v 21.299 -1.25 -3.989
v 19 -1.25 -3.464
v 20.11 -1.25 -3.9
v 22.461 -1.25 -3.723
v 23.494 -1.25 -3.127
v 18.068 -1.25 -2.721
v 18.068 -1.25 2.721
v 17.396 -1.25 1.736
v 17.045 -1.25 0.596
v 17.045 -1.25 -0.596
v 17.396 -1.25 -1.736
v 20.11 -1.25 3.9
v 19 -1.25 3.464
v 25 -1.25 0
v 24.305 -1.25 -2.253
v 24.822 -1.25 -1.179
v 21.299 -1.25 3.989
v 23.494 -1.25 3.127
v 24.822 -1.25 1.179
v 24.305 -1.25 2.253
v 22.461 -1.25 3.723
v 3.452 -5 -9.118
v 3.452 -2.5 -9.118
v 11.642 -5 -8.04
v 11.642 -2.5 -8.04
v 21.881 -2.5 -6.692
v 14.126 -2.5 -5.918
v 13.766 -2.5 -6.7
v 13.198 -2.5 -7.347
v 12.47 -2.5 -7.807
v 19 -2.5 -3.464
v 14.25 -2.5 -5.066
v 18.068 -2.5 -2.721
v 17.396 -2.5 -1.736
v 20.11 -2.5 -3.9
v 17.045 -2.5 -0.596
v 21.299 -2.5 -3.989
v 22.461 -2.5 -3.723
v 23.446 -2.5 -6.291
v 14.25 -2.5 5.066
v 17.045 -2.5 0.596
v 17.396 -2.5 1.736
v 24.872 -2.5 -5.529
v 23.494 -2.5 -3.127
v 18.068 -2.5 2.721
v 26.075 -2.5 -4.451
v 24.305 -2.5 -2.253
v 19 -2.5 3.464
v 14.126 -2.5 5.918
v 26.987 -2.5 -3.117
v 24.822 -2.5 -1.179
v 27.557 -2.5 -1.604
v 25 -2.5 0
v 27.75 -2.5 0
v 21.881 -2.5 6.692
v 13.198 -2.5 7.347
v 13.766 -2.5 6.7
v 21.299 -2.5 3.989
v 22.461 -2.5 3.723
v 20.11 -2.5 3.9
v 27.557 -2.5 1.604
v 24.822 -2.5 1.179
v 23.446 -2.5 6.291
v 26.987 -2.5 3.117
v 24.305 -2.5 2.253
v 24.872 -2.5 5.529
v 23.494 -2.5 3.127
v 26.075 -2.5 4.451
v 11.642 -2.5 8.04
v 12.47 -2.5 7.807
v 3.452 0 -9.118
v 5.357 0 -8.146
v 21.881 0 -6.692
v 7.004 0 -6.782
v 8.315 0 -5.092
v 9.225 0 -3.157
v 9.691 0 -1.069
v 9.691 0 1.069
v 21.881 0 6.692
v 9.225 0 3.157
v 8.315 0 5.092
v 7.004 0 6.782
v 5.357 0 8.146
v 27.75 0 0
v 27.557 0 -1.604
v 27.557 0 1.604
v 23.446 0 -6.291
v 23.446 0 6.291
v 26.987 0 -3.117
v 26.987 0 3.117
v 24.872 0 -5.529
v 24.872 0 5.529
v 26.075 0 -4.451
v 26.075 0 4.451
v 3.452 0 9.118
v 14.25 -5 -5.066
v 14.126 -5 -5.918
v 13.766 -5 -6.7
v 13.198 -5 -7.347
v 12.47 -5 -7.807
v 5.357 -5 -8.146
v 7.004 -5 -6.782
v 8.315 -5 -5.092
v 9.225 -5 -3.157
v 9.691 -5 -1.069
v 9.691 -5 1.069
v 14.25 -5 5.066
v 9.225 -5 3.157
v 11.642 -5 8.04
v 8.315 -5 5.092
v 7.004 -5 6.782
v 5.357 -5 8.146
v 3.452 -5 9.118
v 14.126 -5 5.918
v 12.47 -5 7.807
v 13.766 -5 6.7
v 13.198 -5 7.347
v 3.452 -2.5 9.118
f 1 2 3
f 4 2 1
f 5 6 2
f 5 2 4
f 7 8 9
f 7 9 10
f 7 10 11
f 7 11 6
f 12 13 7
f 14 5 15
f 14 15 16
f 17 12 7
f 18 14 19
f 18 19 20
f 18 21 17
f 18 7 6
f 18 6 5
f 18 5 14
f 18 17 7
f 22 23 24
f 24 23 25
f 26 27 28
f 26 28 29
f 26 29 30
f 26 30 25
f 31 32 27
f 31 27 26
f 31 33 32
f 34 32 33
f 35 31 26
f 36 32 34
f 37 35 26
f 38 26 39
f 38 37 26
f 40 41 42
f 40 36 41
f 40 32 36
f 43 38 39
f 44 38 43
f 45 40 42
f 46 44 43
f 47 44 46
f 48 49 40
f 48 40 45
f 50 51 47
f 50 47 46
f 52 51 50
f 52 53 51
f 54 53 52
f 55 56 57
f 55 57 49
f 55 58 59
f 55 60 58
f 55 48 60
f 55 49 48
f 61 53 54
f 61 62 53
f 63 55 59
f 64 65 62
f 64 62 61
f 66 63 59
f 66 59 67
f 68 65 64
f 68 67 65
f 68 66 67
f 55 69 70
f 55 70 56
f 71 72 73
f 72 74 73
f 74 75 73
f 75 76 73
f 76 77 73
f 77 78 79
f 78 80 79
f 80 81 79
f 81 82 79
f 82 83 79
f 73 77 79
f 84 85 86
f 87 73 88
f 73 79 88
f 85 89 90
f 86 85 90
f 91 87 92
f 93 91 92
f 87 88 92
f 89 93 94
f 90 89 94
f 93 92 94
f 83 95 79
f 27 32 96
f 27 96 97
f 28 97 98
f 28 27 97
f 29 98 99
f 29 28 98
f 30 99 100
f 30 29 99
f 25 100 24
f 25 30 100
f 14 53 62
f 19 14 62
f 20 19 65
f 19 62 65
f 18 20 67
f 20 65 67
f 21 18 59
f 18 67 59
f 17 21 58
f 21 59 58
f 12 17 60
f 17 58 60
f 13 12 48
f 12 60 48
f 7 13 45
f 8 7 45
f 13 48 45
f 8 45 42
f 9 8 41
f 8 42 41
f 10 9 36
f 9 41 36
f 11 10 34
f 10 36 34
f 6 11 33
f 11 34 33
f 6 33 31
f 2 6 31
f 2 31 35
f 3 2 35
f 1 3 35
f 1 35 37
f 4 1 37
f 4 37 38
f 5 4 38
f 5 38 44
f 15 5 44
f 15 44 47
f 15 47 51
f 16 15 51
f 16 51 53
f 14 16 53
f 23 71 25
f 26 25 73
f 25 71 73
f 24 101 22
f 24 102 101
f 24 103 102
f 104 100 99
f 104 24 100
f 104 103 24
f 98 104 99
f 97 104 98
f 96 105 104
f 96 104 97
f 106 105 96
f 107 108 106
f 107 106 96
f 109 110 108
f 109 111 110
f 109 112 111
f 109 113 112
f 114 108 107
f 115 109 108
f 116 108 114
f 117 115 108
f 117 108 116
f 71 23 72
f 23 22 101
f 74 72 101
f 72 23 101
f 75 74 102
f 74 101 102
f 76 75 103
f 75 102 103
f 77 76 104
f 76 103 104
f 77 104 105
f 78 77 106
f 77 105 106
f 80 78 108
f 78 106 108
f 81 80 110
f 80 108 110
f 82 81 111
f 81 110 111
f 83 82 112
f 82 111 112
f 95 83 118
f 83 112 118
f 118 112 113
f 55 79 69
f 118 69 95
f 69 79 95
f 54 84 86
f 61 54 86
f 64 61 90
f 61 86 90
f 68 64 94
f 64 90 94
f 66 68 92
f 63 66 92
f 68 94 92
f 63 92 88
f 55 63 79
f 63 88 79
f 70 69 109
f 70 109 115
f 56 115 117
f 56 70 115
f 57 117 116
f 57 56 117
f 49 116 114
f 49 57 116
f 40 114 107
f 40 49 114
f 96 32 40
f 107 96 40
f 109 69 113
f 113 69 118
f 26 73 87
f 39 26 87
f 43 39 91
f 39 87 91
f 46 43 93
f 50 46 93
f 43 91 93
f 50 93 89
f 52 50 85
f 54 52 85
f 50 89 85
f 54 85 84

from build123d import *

# Parameters (mm, degrees)
F0_R         = 8
F1_DEPTH     = 10
F2_R         = 1.5
F3_DEPTH     = 22.1
F4_R         = 1.4
F5_DEPTH     = 8
F6_T1_DEPTH  = 25.4217528018
F7_R         = 2
F8_R         = 2
F10_DEPTH    = 2.5
F11_R        = 4
F12_DEPTH    = 6
F14_DEPTH    = 2.5
F15_T1_DEPTH = 9.0773234724
F17_DEPTH    = 25
F18_DEPTH    = 7.25


# Not quite as in the source:
# - a fillet or chamfer that OpenCascade refuses, or shapes differently, is made with other operations: its cross-section is extruded or revolved along the edge and cut away or added


with BuildPart() as f1:
    # F0 (on Front) → F1 (new body)
    with BuildSketch(Plane.XZ):
        with BuildLine():
            ThreePointArc((-5.123475383, -8), (4.5594398703, -8.3343570879), (9.5, 0))
            ThreePointArc((9.5, 0), (2.5991730895, 9.1375215048), (-8.0777472107, 5))
            ThreePointArc((-8.0777472107, 5), (-8.4879541617, 4.2666888975), (-8.8317608663, 3.5))
            ThreePointArc((-8.8317608663, 3.5), (-9.0415515645, -2.9155351664), (-5.123475383, -8))
        make_face()
        Circle(F0_R, mode=Mode.SUBTRACT)
        with BuildLine():
            ThreePointArc((-8.8317608663, 3.5), (-8.4879541617, 4.2666888975), (-8.0777472107, 5))
            Line((-8.0777472107, 5), (-23.5, 5))
            ThreePointArc((-23.5, 5), (-24.7247448714, 4.5811388301), (-25.4364916731, 3.5))
            Line((-25.4364916731, 3.5), (-8.8317608663, 3.5))
        make_face()
        with BuildLine():
            Line((-23.5, -8), (-5.123475383, -8))
            ThreePointArc((-5.123475383, -8), (-9.0415515645, -2.9155351664), (-8.8317608663, 3.5))
            Line((-8.8317608663, 3.5), (-25.4364916731, 3.5))
            ThreePointArc((-25.4364916731, 3.5), (-25.4840593925, 3.252008585), (-25.5, 3))
            Line((-25.5, 3), (-25.5, 0))
            Line((-25.5, 0), (-25.5, -3.5))
            Line((-25.5, -3.5), (-25.5, -6))
            ThreePointArc((-25.5, -6), (-24.9142135624, -7.4142135624), (-23.5, -8))
        make_face()
        with BuildLine():
            ThreePointArc((-25.5, 3), (-25.4840593925, 3.252008585), (-25.4364916731, 3.5))
            Line((-25.4364916731, 3.5), (-25.5, 3.5))
            Line((-25.5, 3.5), (-31.5, 3.5))
            ThreePointArc((-31.5, 3.5), (-32.2071067812, 3.2071067812), (-32.5, 2.5))
            Line((-32.5, 2.5), (-32.5, 1.5))
            Line((-32.5, 1.5), (-32.5, 0))
            Line((-32.5, 0), (-32.5, -1.5))
            Line((-32.5, -1.5), (-32.5, -2.5))
            ThreePointArc((-32.5, -2.5), (-32.2071067812, -3.2071067812), (-31.5, -3.5))
            Line((-31.5, -3.5), (-25.5, -3.5))
            Line((-25.5, -3.5), (-25.5, 0))
            Line((-25.5, 0), (-25.5, 3))
        make_face()
    extrude(amount=F1_DEPTH)

    # F2 (on face) → F3 (cut)
    with BuildSketch(Plane(origin=(-32.5, 0, 0), x_dir=(0, -1, 0), z_dir=(-1, 0, 0))):
        with Locations((5, 0)):
            Circle(F2_R)
    extrude(amount=-F3_DEPTH, mode=Mode.SUBTRACT)

    # F4 (on face) → F5 (cut)
    with BuildSketch(Plane(origin=(0, 0, -8), x_dir=(1, 0, 0), z_dir=(0, 0, -1))):
        with Locations((-12.4, 5)):
            Circle(F4_R)
        with Locations((-19.5, 5)):
            Circle(F4_R)
    extrude(amount=-F5_DEPTH, mode=Mode.SUBTRACT)

    # F6: fillet of radius 2 on 2 edges, made by hand

    # F6_s2 → F6_t1 (cut)
    with BuildSketch(Plane.YZ.offset(-28.4997500063)):
        with BuildLine():
            ThreePointArc((-8.0001, 5.0001), (-9.4143135624, 4.4143135624), (-10.0001, 3.0001))
            Line((-10.0001, 3.0001), (-10.0401, 3.0001))
            ThreePointArc((-10.0401, 3.0001), (-10.04, 4.00005), (-10.04, 5))
            Line((-10.04, 5), (-10, 5.04))
            ThreePointArc((-10, 5.04), (-9.00005, 5.04), (-8.0001, 5.0401))
            Line((-8.0001, 5.0401), (-8.0001, 5.0001))
        make_face()
        with BuildLine():
            ThreePointArc((-1.9999, 5.0001), (-0.5856864376, 4.4143135624), (0.0001, 3.0001))
            Line((0.0001, 3.0001), (0.0401, 3.0001))
            ThreePointArc((0.0401, 3.0001), (0.04, 4.00005), (0.04, 5))
            Line((0.04, 5), (0, 5.04))
            ThreePointArc((0, 5.04), (-0.99995, 5.04), (-1.9999, 5.0401))
            Line((-1.9999, 5.0401), (-1.9999, 5.0001))
        make_face()
    extrude(amount=F6_T1_DEPTH, mode=Mode.SUBTRACT)

    # F7
    f7_edges = [f1.edges().sort_by_distance(p)[0] for p in [
        (-32.5, -10, 0),
        (-32.5, 0, 0),
    ]]
    fillet(f7_edges, radius=F7_R)

    # F8
    f8_edges = [f1.edges().sort_by_distance(p)[0] for p in [
        (-14.311738, -10, -8),
        (-14.311738, 0, -8),
    ]]
    fillet(f8_edges, radius=F8_R)

    # F9 (on Front) → F10 (join)
    with BuildSketch(Plane.XZ):
        with BuildLine():
            ThreePointArc((0.8300844627, 8.6718317984), (6.4467419184, 5.8591147448), (8.7114698505, 0))
            Line((8.7114698505, 0), (14.25, 0))
            ThreePointArc((14.25, 0), (16.5494157481, 5.0749187005), (21.8810517975, 6.6922528143))
            Line((21.8810517975, 6.6922528143), (1.6475767802, 9.3560403352))
            Line((1.6475767802, 9.3560403352), (0.8300844627, 9.4636652405))
            Line((0.8300844627, 9.4636652405), (0.8300844627, 8.6718317984))
        make_face()
        with BuildLine():
            Line((14.25, 0), (8.7114698505, 0))
            ThreePointArc((8.7114698505, 0), (6.4467419184, -5.8591147448), (0.8300844627, -8.6718317984))
            Line((0.8300844627, -8.6718317984), (0.8300844627, -9.4636652405))
            Line((0.8300844627, -9.4636652405), (1.6475767802, -9.3560403352))
            Line((1.6475767802, -9.3560403352), (21.8810517975, -6.6922528143))
            ThreePointArc((21.8810517975, -6.6922528143), (16.5494157481, -5.0749187005), (14.25, 0))
        make_face()
        with BuildLine():
            ThreePointArc((21.8810517975, 6.6922528143), (16.5494157481, 5.0749187005), (14.25, 0))
            Line((14.25, 0), (21, 0))
            Line((21, 0), (21.8810517975, -6.6922528143))
            ThreePointArc((21.8810517975, -6.6922528143), (26.0749187005, -4.4505842519), (27.75, 0))
            ThreePointArc((27.75, 0), (26.0749187005, 4.4505842519), (21.8810517975, 6.6922528143))
        make_face()
        with BuildLine():
            Line((21, 0), (14.25, 0))
            ThreePointArc((14.25, 0), (16.5494157481, -5.0749187005), (21.8810517975, -6.6922528143))
            Line((21.8810517975, -6.6922528143), (21, 0))
        make_face()
        with BuildLine():
            Line((1.6475767802, -9.3560403352), (0.8300844627, -9.4636652405))
            ThreePointArc((0.8300844627, -9.4636652405), (1.2399988261, -9.4187261831), (1.6475767802, -9.3560403352))
        make_face()
        with BuildLine():
            ThreePointArc((1.6475767802, 9.3560403352), (1.2399988261, 9.4187261831), (0.8300844627, 9.4636652405))
            Line((0.8300844627, 9.4636652405), (1.6475767802, 9.3560403352))
        make_face()
    extrude(amount=F10_DEPTH)

    # F11 (on face) → F12 (join)
    with BuildSketch(Plane.XZ.offset(2.5)):
        with Locations((21, 0)):
            Circle(F11_R)
    extrude(amount=F12_DEPTH)

    # F13 (on face) → F14 (join)
    with BuildSketch(Plane.XZ.offset(2.5)):
        with BuildLine():
            Line((14.25, -7.6968998426), (14.25, 0))
            Line((14.25, 0), (14.25, 7.6968998426))
            Line((14.25, 7.6968998426), (1.6475767802, 9.3560403352))
            Line((1.6475767802, 9.3560403352), (1.6475767802, 8.3387943225))
            ThreePointArc((1.6475767802, 8.3387943225), (8.5, 0), (1.6475767802, -8.3387943225))
            Line((1.6475767802, -8.3387943225), (1.6475767802, -9.3560403352))
            Line((1.6475767802, -9.3560403352), (14.25, -7.6968998426))
        make_face()
    extrude(amount=F14_DEPTH)

    # F15: fillet of radius 3 on 2 edges, made by hand

    # F15_s2 → F15_t1 (cut)
    with BuildSketch(Plane.XZ.offset(2.5)):
        with BuildLine():
            ThreePointArc((11.6415785767, 8.0403050378), (13.5055194224, 7.044007899), (14.25, 5.0659704537))
            Line((14.25, 5.0659704537), (14.25, 7.6968998426))
            Line((14.25, 7.6968998426), (11.6415785767, 8.0403050378))
        make_face()
        with BuildLine():
            ThreePointArc((14.25, -5.0659704537), (13.5055194224, -7.044007899), (11.6415785767, -8.0403050378))
            Line((11.6415785767, -8.0403050378), (14.25, -7.6968998426))
            Line((14.25, -7.6968998426), (14.25, -5.0659704537))
        make_face()
    extrude(amount=F15_T1_DEPTH, mode=Mode.SUBTRACT)

    # F16 (on face) → F17 (cut)
    with BuildSketch(Plane.XZ.offset(10)):
        with BuildLine():
            Line((-37.4530367553, -9.75), (0, -9.75))
            ThreePointArc((0, -9.75), (9.75, 0), (0, 9.75))
            Line((0, 9.75), (0, 13.4185552597))
            Line((0, 13.4185552597), (-34.6982963383, 13.4185552597))
            Line((-34.6982963383, 13.4185552597), (-37.4530367553, 13.4185552597))
            Line((-37.4530367553, 13.4185552597), (-37.4530367553, -9.75))
        make_face()
    extrude(amount=-F17_DEPTH, mode=Mode.SUBTRACT)

    # F18 (cut): a face of the model
    f18_faces = [f1.faces().sort_by_distance(p)[0] for p in [
        (21, -8.5, 0),
    ]]
    extrude(f18_faces, amount=-F18_DEPTH, mode=Mode.SUBTRACT)


solid = f1.part
